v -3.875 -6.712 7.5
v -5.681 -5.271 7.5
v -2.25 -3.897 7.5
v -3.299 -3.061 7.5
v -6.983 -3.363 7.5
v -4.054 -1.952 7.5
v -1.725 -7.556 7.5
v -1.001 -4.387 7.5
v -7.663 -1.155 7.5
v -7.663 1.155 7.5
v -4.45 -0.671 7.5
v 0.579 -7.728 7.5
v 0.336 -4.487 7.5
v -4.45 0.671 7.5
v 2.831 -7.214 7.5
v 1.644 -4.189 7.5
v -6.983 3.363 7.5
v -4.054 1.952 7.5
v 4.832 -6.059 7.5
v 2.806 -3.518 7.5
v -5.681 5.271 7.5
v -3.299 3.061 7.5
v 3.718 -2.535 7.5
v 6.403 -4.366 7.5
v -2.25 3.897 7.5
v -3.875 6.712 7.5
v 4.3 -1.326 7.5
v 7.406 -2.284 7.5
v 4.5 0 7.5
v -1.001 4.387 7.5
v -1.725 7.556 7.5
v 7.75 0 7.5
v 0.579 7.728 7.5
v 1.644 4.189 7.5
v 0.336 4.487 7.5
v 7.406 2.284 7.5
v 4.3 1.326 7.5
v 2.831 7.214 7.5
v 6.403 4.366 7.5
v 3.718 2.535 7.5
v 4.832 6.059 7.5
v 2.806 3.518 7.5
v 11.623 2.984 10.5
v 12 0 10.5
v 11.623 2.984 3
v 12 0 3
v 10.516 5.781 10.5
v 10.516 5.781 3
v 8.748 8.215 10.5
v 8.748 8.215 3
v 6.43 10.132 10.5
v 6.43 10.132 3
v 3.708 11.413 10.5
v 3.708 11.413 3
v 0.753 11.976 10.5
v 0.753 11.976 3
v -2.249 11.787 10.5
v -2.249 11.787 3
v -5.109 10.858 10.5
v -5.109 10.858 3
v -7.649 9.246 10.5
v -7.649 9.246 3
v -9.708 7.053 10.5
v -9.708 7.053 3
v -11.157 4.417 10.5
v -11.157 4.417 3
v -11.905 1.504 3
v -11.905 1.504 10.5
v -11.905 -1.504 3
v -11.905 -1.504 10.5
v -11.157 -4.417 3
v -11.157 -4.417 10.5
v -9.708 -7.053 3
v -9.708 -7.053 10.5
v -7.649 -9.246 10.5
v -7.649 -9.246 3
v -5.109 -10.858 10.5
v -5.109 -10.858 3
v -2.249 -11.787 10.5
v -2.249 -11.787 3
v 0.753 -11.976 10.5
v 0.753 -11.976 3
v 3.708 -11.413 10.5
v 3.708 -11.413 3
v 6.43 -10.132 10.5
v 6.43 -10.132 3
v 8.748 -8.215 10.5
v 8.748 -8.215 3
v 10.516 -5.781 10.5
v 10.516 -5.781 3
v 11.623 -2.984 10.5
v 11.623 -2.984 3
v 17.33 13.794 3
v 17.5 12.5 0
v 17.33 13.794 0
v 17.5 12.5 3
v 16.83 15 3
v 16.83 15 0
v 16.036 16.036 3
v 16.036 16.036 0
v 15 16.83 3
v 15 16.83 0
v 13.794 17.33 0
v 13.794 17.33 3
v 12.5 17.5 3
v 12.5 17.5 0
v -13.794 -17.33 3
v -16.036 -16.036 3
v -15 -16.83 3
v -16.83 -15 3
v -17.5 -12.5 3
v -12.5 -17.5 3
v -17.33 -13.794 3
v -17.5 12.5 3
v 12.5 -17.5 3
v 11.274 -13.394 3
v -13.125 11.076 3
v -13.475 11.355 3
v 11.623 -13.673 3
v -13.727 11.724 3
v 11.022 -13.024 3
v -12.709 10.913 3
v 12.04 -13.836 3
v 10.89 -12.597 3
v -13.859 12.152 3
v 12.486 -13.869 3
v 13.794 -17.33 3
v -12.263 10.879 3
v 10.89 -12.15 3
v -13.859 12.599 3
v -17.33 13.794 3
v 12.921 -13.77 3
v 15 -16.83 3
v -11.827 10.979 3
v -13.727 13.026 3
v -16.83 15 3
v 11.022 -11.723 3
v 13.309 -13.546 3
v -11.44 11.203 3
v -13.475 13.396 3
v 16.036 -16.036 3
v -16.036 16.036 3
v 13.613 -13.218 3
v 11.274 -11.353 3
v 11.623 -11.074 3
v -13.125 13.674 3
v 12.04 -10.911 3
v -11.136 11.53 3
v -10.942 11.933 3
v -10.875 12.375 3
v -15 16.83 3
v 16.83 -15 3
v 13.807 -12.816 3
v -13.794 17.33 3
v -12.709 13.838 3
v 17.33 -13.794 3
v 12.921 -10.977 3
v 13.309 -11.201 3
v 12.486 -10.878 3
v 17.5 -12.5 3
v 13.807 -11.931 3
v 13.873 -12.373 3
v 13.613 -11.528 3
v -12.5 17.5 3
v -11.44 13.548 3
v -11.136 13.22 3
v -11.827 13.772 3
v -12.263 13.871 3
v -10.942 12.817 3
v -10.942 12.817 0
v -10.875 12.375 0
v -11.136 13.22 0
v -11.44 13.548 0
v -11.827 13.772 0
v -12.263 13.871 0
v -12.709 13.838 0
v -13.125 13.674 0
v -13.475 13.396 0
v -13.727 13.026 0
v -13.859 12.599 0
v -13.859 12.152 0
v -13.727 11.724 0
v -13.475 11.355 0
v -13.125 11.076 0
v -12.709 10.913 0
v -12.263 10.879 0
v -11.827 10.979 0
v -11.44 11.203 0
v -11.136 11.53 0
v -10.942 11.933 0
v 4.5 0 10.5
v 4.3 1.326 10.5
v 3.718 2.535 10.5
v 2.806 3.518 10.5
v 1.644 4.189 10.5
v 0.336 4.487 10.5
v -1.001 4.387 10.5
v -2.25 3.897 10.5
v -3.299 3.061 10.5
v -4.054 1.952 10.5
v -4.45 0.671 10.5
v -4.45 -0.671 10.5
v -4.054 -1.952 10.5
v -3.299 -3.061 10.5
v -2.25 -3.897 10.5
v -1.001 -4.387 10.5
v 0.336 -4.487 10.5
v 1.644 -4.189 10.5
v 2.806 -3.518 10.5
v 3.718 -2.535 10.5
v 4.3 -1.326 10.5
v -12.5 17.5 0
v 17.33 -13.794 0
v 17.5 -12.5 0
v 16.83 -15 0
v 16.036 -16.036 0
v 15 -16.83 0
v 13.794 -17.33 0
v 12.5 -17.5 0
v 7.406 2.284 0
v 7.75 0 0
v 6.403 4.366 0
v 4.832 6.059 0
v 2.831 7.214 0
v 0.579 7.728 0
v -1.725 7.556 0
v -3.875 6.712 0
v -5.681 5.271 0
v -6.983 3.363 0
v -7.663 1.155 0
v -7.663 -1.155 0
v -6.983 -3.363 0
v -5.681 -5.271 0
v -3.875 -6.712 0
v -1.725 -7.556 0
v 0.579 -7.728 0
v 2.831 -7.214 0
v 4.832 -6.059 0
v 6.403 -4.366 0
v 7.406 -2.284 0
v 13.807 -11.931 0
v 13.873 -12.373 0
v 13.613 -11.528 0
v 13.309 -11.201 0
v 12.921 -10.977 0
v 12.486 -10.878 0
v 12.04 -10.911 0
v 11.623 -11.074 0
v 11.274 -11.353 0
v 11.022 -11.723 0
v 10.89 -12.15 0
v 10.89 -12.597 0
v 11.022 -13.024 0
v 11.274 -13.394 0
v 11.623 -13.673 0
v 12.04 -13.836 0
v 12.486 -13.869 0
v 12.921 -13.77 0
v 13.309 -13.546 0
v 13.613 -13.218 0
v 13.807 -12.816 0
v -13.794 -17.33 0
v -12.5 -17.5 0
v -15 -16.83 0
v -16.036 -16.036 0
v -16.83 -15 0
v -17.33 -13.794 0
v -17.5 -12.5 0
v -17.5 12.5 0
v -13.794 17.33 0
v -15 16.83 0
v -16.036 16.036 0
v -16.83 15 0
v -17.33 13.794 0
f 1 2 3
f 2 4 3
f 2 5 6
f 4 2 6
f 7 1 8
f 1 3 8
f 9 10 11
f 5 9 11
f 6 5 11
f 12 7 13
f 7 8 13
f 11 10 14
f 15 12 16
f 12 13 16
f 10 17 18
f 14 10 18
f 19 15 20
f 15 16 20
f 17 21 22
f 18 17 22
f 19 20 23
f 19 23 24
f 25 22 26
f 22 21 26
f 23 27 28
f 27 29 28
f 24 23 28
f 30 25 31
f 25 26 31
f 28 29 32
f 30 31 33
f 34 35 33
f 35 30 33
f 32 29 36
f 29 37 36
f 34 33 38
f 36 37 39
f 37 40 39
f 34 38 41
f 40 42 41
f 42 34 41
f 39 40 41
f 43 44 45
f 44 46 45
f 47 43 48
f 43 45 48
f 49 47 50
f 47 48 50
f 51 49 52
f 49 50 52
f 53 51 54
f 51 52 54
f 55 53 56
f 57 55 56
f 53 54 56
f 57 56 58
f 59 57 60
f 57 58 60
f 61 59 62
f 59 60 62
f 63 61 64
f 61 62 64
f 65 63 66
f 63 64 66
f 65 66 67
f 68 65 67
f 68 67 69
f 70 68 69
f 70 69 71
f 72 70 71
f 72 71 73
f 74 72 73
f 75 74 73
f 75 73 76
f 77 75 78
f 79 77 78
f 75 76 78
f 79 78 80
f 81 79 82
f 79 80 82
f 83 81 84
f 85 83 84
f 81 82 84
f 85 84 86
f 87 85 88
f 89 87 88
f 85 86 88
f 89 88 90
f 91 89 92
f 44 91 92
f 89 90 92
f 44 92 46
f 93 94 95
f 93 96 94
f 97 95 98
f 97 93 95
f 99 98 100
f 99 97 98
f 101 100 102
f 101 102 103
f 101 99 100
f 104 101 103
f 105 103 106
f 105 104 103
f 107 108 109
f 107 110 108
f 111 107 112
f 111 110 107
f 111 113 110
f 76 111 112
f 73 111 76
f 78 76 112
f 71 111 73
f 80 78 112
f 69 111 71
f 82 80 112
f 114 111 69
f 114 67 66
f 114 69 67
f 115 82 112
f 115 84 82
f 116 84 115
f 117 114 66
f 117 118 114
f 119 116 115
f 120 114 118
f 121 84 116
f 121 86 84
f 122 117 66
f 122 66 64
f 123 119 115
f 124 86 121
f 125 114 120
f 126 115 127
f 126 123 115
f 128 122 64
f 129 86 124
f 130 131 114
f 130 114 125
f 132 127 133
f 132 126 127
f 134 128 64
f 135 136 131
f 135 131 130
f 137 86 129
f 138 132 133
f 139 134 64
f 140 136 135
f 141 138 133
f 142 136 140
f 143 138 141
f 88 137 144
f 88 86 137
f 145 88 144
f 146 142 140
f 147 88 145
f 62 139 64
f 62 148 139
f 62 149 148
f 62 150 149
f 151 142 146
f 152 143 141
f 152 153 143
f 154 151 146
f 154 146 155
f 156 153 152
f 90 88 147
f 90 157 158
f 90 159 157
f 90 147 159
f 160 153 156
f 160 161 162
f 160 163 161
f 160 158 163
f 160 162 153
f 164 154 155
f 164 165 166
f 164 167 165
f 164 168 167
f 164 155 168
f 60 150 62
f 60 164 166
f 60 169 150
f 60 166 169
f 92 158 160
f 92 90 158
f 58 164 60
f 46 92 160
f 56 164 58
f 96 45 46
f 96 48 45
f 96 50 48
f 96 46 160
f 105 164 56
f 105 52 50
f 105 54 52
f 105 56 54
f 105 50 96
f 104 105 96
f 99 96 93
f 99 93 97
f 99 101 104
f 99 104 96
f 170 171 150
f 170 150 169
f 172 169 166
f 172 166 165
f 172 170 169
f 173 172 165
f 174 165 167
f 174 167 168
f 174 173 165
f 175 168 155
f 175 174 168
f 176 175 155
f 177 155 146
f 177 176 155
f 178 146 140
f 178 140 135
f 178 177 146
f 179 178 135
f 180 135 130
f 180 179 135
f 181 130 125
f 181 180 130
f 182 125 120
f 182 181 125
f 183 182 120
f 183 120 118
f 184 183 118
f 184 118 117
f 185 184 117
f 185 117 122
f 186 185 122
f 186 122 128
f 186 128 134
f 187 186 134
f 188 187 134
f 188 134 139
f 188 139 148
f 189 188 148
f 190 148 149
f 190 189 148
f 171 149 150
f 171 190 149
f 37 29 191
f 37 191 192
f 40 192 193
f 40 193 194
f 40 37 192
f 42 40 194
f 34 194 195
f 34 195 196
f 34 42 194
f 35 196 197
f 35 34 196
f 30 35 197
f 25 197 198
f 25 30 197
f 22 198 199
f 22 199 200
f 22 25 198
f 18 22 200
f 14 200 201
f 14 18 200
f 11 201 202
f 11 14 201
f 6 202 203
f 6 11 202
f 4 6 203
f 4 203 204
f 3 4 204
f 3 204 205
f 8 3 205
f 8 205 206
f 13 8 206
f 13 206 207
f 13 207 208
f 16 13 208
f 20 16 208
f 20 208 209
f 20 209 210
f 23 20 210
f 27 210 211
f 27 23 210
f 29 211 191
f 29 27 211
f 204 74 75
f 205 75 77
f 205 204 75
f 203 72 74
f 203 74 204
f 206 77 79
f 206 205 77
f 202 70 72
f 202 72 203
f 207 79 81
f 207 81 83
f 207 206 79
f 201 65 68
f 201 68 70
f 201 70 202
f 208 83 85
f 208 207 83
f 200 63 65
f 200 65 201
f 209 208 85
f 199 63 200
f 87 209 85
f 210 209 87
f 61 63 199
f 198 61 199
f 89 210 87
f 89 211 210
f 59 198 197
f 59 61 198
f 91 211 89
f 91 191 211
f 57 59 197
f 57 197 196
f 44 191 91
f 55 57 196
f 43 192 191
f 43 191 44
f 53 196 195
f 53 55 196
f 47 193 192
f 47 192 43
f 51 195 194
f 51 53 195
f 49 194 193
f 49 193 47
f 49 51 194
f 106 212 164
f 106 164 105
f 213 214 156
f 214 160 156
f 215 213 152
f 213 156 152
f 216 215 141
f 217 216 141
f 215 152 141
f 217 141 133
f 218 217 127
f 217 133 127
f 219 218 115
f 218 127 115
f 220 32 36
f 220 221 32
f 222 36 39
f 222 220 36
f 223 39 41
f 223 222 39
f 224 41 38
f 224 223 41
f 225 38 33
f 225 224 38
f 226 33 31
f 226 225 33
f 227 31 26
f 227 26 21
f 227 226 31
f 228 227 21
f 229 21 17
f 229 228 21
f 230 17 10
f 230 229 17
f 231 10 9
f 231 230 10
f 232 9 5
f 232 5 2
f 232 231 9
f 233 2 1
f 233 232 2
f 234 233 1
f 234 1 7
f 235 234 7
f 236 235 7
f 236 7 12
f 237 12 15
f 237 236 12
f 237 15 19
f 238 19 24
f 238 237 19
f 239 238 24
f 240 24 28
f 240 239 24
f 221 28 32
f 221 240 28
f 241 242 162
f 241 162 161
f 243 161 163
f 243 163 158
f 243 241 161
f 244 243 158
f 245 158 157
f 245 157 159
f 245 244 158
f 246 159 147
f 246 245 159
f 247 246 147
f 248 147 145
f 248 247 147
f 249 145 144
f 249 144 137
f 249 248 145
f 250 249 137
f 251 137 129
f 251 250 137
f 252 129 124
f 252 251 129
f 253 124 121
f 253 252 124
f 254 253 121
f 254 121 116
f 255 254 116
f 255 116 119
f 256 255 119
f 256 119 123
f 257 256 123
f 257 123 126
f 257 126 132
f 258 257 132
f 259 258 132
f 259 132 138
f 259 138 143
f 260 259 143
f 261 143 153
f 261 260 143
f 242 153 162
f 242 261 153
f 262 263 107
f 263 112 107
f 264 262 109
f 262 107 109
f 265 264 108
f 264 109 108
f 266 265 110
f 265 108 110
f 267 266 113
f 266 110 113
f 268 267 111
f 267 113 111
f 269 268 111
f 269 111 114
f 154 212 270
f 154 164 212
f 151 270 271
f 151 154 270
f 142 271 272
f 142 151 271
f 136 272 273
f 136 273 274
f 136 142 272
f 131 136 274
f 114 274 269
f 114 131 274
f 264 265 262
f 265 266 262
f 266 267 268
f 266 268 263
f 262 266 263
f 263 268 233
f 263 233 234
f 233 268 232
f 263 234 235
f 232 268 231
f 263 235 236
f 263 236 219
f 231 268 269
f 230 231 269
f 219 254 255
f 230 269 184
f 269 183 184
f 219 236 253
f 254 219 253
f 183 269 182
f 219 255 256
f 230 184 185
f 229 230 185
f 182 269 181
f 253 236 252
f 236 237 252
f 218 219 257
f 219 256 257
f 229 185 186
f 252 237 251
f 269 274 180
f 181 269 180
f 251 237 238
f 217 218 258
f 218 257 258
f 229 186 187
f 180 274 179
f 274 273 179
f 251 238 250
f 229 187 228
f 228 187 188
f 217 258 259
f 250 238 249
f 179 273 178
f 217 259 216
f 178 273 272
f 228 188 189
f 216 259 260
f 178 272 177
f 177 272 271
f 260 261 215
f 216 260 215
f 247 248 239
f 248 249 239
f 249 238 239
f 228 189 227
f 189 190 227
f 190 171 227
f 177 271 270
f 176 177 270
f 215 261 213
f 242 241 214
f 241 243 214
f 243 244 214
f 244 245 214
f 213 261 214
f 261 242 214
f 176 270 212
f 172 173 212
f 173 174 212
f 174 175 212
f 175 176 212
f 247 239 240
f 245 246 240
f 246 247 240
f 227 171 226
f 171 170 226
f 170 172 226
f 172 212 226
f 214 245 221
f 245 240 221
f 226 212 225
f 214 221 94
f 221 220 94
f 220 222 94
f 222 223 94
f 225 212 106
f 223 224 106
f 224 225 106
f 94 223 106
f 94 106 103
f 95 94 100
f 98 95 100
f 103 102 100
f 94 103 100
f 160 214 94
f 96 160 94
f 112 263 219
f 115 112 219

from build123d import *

# Parameters (mm, degrees)
SKETCH_W      = 35
SKETCH_H      = 35
SKETCH_R      = 7.75
SKETCH_R_2    = 1.5
PAD_DEPTH     = 3
SKETCH001_R   = 12
SKETCH001_R_2 = 7.75
PAD001_DEPTH  = 4.5
SKETCH002_R   = 12
SKETCH002_R_2 = 4.5
PAD002_DEPTH  = 3
FILLET_R      = 5


with BuildPart() as part:
    # Sketch → Pad (new body)
    with BuildSketch(Plane.XY):
        Rectangle(SKETCH_W, SKETCH_H)
        Circle(SKETCH_R, mode=Mode.SUBTRACT)
        with Locations((-12.375262, 12.375262)):
            Circle(SKETCH_R_2, mode=Mode.SUBTRACT)
        with Locations((12.373476, -12.373476)):
            Circle(SKETCH_R_2, mode=Mode.SUBTRACT)
    extrude(amount=PAD_DEPTH)

    # Sketch001 (on Face9 of Pad) → Pad001 (join)
    with BuildSketch(Plane.XY.offset(3)):
        Circle(SKETCH001_R)
        Circle(SKETCH001_R_2, mode=Mode.SUBTRACT)
    extrude(amount=PAD001_DEPTH)

    # Sketch002 (on Face10 of Pad001) → Pad002 (join)
    with BuildSketch(Plane.XY.offset(7.5)):
        Circle(SKETCH002_R)
        Circle(SKETCH002_R_2, mode=Mode.SUBTRACT)
    extrude(amount=PAD002_DEPTH)

    # Fillet
    fillet_edges = [part.edges().sort_by_distance(p)[0] for p in [
        (17.5, -17.5, 1.5),
        (17.5, 17.5, 1.5),
        (-17.5, -17.5, 1.5),
        (-17.5, 17.5, 1.5),
    ]]
    fillet(fillet_edges, radius=FILLET_R)


solid = part.part
